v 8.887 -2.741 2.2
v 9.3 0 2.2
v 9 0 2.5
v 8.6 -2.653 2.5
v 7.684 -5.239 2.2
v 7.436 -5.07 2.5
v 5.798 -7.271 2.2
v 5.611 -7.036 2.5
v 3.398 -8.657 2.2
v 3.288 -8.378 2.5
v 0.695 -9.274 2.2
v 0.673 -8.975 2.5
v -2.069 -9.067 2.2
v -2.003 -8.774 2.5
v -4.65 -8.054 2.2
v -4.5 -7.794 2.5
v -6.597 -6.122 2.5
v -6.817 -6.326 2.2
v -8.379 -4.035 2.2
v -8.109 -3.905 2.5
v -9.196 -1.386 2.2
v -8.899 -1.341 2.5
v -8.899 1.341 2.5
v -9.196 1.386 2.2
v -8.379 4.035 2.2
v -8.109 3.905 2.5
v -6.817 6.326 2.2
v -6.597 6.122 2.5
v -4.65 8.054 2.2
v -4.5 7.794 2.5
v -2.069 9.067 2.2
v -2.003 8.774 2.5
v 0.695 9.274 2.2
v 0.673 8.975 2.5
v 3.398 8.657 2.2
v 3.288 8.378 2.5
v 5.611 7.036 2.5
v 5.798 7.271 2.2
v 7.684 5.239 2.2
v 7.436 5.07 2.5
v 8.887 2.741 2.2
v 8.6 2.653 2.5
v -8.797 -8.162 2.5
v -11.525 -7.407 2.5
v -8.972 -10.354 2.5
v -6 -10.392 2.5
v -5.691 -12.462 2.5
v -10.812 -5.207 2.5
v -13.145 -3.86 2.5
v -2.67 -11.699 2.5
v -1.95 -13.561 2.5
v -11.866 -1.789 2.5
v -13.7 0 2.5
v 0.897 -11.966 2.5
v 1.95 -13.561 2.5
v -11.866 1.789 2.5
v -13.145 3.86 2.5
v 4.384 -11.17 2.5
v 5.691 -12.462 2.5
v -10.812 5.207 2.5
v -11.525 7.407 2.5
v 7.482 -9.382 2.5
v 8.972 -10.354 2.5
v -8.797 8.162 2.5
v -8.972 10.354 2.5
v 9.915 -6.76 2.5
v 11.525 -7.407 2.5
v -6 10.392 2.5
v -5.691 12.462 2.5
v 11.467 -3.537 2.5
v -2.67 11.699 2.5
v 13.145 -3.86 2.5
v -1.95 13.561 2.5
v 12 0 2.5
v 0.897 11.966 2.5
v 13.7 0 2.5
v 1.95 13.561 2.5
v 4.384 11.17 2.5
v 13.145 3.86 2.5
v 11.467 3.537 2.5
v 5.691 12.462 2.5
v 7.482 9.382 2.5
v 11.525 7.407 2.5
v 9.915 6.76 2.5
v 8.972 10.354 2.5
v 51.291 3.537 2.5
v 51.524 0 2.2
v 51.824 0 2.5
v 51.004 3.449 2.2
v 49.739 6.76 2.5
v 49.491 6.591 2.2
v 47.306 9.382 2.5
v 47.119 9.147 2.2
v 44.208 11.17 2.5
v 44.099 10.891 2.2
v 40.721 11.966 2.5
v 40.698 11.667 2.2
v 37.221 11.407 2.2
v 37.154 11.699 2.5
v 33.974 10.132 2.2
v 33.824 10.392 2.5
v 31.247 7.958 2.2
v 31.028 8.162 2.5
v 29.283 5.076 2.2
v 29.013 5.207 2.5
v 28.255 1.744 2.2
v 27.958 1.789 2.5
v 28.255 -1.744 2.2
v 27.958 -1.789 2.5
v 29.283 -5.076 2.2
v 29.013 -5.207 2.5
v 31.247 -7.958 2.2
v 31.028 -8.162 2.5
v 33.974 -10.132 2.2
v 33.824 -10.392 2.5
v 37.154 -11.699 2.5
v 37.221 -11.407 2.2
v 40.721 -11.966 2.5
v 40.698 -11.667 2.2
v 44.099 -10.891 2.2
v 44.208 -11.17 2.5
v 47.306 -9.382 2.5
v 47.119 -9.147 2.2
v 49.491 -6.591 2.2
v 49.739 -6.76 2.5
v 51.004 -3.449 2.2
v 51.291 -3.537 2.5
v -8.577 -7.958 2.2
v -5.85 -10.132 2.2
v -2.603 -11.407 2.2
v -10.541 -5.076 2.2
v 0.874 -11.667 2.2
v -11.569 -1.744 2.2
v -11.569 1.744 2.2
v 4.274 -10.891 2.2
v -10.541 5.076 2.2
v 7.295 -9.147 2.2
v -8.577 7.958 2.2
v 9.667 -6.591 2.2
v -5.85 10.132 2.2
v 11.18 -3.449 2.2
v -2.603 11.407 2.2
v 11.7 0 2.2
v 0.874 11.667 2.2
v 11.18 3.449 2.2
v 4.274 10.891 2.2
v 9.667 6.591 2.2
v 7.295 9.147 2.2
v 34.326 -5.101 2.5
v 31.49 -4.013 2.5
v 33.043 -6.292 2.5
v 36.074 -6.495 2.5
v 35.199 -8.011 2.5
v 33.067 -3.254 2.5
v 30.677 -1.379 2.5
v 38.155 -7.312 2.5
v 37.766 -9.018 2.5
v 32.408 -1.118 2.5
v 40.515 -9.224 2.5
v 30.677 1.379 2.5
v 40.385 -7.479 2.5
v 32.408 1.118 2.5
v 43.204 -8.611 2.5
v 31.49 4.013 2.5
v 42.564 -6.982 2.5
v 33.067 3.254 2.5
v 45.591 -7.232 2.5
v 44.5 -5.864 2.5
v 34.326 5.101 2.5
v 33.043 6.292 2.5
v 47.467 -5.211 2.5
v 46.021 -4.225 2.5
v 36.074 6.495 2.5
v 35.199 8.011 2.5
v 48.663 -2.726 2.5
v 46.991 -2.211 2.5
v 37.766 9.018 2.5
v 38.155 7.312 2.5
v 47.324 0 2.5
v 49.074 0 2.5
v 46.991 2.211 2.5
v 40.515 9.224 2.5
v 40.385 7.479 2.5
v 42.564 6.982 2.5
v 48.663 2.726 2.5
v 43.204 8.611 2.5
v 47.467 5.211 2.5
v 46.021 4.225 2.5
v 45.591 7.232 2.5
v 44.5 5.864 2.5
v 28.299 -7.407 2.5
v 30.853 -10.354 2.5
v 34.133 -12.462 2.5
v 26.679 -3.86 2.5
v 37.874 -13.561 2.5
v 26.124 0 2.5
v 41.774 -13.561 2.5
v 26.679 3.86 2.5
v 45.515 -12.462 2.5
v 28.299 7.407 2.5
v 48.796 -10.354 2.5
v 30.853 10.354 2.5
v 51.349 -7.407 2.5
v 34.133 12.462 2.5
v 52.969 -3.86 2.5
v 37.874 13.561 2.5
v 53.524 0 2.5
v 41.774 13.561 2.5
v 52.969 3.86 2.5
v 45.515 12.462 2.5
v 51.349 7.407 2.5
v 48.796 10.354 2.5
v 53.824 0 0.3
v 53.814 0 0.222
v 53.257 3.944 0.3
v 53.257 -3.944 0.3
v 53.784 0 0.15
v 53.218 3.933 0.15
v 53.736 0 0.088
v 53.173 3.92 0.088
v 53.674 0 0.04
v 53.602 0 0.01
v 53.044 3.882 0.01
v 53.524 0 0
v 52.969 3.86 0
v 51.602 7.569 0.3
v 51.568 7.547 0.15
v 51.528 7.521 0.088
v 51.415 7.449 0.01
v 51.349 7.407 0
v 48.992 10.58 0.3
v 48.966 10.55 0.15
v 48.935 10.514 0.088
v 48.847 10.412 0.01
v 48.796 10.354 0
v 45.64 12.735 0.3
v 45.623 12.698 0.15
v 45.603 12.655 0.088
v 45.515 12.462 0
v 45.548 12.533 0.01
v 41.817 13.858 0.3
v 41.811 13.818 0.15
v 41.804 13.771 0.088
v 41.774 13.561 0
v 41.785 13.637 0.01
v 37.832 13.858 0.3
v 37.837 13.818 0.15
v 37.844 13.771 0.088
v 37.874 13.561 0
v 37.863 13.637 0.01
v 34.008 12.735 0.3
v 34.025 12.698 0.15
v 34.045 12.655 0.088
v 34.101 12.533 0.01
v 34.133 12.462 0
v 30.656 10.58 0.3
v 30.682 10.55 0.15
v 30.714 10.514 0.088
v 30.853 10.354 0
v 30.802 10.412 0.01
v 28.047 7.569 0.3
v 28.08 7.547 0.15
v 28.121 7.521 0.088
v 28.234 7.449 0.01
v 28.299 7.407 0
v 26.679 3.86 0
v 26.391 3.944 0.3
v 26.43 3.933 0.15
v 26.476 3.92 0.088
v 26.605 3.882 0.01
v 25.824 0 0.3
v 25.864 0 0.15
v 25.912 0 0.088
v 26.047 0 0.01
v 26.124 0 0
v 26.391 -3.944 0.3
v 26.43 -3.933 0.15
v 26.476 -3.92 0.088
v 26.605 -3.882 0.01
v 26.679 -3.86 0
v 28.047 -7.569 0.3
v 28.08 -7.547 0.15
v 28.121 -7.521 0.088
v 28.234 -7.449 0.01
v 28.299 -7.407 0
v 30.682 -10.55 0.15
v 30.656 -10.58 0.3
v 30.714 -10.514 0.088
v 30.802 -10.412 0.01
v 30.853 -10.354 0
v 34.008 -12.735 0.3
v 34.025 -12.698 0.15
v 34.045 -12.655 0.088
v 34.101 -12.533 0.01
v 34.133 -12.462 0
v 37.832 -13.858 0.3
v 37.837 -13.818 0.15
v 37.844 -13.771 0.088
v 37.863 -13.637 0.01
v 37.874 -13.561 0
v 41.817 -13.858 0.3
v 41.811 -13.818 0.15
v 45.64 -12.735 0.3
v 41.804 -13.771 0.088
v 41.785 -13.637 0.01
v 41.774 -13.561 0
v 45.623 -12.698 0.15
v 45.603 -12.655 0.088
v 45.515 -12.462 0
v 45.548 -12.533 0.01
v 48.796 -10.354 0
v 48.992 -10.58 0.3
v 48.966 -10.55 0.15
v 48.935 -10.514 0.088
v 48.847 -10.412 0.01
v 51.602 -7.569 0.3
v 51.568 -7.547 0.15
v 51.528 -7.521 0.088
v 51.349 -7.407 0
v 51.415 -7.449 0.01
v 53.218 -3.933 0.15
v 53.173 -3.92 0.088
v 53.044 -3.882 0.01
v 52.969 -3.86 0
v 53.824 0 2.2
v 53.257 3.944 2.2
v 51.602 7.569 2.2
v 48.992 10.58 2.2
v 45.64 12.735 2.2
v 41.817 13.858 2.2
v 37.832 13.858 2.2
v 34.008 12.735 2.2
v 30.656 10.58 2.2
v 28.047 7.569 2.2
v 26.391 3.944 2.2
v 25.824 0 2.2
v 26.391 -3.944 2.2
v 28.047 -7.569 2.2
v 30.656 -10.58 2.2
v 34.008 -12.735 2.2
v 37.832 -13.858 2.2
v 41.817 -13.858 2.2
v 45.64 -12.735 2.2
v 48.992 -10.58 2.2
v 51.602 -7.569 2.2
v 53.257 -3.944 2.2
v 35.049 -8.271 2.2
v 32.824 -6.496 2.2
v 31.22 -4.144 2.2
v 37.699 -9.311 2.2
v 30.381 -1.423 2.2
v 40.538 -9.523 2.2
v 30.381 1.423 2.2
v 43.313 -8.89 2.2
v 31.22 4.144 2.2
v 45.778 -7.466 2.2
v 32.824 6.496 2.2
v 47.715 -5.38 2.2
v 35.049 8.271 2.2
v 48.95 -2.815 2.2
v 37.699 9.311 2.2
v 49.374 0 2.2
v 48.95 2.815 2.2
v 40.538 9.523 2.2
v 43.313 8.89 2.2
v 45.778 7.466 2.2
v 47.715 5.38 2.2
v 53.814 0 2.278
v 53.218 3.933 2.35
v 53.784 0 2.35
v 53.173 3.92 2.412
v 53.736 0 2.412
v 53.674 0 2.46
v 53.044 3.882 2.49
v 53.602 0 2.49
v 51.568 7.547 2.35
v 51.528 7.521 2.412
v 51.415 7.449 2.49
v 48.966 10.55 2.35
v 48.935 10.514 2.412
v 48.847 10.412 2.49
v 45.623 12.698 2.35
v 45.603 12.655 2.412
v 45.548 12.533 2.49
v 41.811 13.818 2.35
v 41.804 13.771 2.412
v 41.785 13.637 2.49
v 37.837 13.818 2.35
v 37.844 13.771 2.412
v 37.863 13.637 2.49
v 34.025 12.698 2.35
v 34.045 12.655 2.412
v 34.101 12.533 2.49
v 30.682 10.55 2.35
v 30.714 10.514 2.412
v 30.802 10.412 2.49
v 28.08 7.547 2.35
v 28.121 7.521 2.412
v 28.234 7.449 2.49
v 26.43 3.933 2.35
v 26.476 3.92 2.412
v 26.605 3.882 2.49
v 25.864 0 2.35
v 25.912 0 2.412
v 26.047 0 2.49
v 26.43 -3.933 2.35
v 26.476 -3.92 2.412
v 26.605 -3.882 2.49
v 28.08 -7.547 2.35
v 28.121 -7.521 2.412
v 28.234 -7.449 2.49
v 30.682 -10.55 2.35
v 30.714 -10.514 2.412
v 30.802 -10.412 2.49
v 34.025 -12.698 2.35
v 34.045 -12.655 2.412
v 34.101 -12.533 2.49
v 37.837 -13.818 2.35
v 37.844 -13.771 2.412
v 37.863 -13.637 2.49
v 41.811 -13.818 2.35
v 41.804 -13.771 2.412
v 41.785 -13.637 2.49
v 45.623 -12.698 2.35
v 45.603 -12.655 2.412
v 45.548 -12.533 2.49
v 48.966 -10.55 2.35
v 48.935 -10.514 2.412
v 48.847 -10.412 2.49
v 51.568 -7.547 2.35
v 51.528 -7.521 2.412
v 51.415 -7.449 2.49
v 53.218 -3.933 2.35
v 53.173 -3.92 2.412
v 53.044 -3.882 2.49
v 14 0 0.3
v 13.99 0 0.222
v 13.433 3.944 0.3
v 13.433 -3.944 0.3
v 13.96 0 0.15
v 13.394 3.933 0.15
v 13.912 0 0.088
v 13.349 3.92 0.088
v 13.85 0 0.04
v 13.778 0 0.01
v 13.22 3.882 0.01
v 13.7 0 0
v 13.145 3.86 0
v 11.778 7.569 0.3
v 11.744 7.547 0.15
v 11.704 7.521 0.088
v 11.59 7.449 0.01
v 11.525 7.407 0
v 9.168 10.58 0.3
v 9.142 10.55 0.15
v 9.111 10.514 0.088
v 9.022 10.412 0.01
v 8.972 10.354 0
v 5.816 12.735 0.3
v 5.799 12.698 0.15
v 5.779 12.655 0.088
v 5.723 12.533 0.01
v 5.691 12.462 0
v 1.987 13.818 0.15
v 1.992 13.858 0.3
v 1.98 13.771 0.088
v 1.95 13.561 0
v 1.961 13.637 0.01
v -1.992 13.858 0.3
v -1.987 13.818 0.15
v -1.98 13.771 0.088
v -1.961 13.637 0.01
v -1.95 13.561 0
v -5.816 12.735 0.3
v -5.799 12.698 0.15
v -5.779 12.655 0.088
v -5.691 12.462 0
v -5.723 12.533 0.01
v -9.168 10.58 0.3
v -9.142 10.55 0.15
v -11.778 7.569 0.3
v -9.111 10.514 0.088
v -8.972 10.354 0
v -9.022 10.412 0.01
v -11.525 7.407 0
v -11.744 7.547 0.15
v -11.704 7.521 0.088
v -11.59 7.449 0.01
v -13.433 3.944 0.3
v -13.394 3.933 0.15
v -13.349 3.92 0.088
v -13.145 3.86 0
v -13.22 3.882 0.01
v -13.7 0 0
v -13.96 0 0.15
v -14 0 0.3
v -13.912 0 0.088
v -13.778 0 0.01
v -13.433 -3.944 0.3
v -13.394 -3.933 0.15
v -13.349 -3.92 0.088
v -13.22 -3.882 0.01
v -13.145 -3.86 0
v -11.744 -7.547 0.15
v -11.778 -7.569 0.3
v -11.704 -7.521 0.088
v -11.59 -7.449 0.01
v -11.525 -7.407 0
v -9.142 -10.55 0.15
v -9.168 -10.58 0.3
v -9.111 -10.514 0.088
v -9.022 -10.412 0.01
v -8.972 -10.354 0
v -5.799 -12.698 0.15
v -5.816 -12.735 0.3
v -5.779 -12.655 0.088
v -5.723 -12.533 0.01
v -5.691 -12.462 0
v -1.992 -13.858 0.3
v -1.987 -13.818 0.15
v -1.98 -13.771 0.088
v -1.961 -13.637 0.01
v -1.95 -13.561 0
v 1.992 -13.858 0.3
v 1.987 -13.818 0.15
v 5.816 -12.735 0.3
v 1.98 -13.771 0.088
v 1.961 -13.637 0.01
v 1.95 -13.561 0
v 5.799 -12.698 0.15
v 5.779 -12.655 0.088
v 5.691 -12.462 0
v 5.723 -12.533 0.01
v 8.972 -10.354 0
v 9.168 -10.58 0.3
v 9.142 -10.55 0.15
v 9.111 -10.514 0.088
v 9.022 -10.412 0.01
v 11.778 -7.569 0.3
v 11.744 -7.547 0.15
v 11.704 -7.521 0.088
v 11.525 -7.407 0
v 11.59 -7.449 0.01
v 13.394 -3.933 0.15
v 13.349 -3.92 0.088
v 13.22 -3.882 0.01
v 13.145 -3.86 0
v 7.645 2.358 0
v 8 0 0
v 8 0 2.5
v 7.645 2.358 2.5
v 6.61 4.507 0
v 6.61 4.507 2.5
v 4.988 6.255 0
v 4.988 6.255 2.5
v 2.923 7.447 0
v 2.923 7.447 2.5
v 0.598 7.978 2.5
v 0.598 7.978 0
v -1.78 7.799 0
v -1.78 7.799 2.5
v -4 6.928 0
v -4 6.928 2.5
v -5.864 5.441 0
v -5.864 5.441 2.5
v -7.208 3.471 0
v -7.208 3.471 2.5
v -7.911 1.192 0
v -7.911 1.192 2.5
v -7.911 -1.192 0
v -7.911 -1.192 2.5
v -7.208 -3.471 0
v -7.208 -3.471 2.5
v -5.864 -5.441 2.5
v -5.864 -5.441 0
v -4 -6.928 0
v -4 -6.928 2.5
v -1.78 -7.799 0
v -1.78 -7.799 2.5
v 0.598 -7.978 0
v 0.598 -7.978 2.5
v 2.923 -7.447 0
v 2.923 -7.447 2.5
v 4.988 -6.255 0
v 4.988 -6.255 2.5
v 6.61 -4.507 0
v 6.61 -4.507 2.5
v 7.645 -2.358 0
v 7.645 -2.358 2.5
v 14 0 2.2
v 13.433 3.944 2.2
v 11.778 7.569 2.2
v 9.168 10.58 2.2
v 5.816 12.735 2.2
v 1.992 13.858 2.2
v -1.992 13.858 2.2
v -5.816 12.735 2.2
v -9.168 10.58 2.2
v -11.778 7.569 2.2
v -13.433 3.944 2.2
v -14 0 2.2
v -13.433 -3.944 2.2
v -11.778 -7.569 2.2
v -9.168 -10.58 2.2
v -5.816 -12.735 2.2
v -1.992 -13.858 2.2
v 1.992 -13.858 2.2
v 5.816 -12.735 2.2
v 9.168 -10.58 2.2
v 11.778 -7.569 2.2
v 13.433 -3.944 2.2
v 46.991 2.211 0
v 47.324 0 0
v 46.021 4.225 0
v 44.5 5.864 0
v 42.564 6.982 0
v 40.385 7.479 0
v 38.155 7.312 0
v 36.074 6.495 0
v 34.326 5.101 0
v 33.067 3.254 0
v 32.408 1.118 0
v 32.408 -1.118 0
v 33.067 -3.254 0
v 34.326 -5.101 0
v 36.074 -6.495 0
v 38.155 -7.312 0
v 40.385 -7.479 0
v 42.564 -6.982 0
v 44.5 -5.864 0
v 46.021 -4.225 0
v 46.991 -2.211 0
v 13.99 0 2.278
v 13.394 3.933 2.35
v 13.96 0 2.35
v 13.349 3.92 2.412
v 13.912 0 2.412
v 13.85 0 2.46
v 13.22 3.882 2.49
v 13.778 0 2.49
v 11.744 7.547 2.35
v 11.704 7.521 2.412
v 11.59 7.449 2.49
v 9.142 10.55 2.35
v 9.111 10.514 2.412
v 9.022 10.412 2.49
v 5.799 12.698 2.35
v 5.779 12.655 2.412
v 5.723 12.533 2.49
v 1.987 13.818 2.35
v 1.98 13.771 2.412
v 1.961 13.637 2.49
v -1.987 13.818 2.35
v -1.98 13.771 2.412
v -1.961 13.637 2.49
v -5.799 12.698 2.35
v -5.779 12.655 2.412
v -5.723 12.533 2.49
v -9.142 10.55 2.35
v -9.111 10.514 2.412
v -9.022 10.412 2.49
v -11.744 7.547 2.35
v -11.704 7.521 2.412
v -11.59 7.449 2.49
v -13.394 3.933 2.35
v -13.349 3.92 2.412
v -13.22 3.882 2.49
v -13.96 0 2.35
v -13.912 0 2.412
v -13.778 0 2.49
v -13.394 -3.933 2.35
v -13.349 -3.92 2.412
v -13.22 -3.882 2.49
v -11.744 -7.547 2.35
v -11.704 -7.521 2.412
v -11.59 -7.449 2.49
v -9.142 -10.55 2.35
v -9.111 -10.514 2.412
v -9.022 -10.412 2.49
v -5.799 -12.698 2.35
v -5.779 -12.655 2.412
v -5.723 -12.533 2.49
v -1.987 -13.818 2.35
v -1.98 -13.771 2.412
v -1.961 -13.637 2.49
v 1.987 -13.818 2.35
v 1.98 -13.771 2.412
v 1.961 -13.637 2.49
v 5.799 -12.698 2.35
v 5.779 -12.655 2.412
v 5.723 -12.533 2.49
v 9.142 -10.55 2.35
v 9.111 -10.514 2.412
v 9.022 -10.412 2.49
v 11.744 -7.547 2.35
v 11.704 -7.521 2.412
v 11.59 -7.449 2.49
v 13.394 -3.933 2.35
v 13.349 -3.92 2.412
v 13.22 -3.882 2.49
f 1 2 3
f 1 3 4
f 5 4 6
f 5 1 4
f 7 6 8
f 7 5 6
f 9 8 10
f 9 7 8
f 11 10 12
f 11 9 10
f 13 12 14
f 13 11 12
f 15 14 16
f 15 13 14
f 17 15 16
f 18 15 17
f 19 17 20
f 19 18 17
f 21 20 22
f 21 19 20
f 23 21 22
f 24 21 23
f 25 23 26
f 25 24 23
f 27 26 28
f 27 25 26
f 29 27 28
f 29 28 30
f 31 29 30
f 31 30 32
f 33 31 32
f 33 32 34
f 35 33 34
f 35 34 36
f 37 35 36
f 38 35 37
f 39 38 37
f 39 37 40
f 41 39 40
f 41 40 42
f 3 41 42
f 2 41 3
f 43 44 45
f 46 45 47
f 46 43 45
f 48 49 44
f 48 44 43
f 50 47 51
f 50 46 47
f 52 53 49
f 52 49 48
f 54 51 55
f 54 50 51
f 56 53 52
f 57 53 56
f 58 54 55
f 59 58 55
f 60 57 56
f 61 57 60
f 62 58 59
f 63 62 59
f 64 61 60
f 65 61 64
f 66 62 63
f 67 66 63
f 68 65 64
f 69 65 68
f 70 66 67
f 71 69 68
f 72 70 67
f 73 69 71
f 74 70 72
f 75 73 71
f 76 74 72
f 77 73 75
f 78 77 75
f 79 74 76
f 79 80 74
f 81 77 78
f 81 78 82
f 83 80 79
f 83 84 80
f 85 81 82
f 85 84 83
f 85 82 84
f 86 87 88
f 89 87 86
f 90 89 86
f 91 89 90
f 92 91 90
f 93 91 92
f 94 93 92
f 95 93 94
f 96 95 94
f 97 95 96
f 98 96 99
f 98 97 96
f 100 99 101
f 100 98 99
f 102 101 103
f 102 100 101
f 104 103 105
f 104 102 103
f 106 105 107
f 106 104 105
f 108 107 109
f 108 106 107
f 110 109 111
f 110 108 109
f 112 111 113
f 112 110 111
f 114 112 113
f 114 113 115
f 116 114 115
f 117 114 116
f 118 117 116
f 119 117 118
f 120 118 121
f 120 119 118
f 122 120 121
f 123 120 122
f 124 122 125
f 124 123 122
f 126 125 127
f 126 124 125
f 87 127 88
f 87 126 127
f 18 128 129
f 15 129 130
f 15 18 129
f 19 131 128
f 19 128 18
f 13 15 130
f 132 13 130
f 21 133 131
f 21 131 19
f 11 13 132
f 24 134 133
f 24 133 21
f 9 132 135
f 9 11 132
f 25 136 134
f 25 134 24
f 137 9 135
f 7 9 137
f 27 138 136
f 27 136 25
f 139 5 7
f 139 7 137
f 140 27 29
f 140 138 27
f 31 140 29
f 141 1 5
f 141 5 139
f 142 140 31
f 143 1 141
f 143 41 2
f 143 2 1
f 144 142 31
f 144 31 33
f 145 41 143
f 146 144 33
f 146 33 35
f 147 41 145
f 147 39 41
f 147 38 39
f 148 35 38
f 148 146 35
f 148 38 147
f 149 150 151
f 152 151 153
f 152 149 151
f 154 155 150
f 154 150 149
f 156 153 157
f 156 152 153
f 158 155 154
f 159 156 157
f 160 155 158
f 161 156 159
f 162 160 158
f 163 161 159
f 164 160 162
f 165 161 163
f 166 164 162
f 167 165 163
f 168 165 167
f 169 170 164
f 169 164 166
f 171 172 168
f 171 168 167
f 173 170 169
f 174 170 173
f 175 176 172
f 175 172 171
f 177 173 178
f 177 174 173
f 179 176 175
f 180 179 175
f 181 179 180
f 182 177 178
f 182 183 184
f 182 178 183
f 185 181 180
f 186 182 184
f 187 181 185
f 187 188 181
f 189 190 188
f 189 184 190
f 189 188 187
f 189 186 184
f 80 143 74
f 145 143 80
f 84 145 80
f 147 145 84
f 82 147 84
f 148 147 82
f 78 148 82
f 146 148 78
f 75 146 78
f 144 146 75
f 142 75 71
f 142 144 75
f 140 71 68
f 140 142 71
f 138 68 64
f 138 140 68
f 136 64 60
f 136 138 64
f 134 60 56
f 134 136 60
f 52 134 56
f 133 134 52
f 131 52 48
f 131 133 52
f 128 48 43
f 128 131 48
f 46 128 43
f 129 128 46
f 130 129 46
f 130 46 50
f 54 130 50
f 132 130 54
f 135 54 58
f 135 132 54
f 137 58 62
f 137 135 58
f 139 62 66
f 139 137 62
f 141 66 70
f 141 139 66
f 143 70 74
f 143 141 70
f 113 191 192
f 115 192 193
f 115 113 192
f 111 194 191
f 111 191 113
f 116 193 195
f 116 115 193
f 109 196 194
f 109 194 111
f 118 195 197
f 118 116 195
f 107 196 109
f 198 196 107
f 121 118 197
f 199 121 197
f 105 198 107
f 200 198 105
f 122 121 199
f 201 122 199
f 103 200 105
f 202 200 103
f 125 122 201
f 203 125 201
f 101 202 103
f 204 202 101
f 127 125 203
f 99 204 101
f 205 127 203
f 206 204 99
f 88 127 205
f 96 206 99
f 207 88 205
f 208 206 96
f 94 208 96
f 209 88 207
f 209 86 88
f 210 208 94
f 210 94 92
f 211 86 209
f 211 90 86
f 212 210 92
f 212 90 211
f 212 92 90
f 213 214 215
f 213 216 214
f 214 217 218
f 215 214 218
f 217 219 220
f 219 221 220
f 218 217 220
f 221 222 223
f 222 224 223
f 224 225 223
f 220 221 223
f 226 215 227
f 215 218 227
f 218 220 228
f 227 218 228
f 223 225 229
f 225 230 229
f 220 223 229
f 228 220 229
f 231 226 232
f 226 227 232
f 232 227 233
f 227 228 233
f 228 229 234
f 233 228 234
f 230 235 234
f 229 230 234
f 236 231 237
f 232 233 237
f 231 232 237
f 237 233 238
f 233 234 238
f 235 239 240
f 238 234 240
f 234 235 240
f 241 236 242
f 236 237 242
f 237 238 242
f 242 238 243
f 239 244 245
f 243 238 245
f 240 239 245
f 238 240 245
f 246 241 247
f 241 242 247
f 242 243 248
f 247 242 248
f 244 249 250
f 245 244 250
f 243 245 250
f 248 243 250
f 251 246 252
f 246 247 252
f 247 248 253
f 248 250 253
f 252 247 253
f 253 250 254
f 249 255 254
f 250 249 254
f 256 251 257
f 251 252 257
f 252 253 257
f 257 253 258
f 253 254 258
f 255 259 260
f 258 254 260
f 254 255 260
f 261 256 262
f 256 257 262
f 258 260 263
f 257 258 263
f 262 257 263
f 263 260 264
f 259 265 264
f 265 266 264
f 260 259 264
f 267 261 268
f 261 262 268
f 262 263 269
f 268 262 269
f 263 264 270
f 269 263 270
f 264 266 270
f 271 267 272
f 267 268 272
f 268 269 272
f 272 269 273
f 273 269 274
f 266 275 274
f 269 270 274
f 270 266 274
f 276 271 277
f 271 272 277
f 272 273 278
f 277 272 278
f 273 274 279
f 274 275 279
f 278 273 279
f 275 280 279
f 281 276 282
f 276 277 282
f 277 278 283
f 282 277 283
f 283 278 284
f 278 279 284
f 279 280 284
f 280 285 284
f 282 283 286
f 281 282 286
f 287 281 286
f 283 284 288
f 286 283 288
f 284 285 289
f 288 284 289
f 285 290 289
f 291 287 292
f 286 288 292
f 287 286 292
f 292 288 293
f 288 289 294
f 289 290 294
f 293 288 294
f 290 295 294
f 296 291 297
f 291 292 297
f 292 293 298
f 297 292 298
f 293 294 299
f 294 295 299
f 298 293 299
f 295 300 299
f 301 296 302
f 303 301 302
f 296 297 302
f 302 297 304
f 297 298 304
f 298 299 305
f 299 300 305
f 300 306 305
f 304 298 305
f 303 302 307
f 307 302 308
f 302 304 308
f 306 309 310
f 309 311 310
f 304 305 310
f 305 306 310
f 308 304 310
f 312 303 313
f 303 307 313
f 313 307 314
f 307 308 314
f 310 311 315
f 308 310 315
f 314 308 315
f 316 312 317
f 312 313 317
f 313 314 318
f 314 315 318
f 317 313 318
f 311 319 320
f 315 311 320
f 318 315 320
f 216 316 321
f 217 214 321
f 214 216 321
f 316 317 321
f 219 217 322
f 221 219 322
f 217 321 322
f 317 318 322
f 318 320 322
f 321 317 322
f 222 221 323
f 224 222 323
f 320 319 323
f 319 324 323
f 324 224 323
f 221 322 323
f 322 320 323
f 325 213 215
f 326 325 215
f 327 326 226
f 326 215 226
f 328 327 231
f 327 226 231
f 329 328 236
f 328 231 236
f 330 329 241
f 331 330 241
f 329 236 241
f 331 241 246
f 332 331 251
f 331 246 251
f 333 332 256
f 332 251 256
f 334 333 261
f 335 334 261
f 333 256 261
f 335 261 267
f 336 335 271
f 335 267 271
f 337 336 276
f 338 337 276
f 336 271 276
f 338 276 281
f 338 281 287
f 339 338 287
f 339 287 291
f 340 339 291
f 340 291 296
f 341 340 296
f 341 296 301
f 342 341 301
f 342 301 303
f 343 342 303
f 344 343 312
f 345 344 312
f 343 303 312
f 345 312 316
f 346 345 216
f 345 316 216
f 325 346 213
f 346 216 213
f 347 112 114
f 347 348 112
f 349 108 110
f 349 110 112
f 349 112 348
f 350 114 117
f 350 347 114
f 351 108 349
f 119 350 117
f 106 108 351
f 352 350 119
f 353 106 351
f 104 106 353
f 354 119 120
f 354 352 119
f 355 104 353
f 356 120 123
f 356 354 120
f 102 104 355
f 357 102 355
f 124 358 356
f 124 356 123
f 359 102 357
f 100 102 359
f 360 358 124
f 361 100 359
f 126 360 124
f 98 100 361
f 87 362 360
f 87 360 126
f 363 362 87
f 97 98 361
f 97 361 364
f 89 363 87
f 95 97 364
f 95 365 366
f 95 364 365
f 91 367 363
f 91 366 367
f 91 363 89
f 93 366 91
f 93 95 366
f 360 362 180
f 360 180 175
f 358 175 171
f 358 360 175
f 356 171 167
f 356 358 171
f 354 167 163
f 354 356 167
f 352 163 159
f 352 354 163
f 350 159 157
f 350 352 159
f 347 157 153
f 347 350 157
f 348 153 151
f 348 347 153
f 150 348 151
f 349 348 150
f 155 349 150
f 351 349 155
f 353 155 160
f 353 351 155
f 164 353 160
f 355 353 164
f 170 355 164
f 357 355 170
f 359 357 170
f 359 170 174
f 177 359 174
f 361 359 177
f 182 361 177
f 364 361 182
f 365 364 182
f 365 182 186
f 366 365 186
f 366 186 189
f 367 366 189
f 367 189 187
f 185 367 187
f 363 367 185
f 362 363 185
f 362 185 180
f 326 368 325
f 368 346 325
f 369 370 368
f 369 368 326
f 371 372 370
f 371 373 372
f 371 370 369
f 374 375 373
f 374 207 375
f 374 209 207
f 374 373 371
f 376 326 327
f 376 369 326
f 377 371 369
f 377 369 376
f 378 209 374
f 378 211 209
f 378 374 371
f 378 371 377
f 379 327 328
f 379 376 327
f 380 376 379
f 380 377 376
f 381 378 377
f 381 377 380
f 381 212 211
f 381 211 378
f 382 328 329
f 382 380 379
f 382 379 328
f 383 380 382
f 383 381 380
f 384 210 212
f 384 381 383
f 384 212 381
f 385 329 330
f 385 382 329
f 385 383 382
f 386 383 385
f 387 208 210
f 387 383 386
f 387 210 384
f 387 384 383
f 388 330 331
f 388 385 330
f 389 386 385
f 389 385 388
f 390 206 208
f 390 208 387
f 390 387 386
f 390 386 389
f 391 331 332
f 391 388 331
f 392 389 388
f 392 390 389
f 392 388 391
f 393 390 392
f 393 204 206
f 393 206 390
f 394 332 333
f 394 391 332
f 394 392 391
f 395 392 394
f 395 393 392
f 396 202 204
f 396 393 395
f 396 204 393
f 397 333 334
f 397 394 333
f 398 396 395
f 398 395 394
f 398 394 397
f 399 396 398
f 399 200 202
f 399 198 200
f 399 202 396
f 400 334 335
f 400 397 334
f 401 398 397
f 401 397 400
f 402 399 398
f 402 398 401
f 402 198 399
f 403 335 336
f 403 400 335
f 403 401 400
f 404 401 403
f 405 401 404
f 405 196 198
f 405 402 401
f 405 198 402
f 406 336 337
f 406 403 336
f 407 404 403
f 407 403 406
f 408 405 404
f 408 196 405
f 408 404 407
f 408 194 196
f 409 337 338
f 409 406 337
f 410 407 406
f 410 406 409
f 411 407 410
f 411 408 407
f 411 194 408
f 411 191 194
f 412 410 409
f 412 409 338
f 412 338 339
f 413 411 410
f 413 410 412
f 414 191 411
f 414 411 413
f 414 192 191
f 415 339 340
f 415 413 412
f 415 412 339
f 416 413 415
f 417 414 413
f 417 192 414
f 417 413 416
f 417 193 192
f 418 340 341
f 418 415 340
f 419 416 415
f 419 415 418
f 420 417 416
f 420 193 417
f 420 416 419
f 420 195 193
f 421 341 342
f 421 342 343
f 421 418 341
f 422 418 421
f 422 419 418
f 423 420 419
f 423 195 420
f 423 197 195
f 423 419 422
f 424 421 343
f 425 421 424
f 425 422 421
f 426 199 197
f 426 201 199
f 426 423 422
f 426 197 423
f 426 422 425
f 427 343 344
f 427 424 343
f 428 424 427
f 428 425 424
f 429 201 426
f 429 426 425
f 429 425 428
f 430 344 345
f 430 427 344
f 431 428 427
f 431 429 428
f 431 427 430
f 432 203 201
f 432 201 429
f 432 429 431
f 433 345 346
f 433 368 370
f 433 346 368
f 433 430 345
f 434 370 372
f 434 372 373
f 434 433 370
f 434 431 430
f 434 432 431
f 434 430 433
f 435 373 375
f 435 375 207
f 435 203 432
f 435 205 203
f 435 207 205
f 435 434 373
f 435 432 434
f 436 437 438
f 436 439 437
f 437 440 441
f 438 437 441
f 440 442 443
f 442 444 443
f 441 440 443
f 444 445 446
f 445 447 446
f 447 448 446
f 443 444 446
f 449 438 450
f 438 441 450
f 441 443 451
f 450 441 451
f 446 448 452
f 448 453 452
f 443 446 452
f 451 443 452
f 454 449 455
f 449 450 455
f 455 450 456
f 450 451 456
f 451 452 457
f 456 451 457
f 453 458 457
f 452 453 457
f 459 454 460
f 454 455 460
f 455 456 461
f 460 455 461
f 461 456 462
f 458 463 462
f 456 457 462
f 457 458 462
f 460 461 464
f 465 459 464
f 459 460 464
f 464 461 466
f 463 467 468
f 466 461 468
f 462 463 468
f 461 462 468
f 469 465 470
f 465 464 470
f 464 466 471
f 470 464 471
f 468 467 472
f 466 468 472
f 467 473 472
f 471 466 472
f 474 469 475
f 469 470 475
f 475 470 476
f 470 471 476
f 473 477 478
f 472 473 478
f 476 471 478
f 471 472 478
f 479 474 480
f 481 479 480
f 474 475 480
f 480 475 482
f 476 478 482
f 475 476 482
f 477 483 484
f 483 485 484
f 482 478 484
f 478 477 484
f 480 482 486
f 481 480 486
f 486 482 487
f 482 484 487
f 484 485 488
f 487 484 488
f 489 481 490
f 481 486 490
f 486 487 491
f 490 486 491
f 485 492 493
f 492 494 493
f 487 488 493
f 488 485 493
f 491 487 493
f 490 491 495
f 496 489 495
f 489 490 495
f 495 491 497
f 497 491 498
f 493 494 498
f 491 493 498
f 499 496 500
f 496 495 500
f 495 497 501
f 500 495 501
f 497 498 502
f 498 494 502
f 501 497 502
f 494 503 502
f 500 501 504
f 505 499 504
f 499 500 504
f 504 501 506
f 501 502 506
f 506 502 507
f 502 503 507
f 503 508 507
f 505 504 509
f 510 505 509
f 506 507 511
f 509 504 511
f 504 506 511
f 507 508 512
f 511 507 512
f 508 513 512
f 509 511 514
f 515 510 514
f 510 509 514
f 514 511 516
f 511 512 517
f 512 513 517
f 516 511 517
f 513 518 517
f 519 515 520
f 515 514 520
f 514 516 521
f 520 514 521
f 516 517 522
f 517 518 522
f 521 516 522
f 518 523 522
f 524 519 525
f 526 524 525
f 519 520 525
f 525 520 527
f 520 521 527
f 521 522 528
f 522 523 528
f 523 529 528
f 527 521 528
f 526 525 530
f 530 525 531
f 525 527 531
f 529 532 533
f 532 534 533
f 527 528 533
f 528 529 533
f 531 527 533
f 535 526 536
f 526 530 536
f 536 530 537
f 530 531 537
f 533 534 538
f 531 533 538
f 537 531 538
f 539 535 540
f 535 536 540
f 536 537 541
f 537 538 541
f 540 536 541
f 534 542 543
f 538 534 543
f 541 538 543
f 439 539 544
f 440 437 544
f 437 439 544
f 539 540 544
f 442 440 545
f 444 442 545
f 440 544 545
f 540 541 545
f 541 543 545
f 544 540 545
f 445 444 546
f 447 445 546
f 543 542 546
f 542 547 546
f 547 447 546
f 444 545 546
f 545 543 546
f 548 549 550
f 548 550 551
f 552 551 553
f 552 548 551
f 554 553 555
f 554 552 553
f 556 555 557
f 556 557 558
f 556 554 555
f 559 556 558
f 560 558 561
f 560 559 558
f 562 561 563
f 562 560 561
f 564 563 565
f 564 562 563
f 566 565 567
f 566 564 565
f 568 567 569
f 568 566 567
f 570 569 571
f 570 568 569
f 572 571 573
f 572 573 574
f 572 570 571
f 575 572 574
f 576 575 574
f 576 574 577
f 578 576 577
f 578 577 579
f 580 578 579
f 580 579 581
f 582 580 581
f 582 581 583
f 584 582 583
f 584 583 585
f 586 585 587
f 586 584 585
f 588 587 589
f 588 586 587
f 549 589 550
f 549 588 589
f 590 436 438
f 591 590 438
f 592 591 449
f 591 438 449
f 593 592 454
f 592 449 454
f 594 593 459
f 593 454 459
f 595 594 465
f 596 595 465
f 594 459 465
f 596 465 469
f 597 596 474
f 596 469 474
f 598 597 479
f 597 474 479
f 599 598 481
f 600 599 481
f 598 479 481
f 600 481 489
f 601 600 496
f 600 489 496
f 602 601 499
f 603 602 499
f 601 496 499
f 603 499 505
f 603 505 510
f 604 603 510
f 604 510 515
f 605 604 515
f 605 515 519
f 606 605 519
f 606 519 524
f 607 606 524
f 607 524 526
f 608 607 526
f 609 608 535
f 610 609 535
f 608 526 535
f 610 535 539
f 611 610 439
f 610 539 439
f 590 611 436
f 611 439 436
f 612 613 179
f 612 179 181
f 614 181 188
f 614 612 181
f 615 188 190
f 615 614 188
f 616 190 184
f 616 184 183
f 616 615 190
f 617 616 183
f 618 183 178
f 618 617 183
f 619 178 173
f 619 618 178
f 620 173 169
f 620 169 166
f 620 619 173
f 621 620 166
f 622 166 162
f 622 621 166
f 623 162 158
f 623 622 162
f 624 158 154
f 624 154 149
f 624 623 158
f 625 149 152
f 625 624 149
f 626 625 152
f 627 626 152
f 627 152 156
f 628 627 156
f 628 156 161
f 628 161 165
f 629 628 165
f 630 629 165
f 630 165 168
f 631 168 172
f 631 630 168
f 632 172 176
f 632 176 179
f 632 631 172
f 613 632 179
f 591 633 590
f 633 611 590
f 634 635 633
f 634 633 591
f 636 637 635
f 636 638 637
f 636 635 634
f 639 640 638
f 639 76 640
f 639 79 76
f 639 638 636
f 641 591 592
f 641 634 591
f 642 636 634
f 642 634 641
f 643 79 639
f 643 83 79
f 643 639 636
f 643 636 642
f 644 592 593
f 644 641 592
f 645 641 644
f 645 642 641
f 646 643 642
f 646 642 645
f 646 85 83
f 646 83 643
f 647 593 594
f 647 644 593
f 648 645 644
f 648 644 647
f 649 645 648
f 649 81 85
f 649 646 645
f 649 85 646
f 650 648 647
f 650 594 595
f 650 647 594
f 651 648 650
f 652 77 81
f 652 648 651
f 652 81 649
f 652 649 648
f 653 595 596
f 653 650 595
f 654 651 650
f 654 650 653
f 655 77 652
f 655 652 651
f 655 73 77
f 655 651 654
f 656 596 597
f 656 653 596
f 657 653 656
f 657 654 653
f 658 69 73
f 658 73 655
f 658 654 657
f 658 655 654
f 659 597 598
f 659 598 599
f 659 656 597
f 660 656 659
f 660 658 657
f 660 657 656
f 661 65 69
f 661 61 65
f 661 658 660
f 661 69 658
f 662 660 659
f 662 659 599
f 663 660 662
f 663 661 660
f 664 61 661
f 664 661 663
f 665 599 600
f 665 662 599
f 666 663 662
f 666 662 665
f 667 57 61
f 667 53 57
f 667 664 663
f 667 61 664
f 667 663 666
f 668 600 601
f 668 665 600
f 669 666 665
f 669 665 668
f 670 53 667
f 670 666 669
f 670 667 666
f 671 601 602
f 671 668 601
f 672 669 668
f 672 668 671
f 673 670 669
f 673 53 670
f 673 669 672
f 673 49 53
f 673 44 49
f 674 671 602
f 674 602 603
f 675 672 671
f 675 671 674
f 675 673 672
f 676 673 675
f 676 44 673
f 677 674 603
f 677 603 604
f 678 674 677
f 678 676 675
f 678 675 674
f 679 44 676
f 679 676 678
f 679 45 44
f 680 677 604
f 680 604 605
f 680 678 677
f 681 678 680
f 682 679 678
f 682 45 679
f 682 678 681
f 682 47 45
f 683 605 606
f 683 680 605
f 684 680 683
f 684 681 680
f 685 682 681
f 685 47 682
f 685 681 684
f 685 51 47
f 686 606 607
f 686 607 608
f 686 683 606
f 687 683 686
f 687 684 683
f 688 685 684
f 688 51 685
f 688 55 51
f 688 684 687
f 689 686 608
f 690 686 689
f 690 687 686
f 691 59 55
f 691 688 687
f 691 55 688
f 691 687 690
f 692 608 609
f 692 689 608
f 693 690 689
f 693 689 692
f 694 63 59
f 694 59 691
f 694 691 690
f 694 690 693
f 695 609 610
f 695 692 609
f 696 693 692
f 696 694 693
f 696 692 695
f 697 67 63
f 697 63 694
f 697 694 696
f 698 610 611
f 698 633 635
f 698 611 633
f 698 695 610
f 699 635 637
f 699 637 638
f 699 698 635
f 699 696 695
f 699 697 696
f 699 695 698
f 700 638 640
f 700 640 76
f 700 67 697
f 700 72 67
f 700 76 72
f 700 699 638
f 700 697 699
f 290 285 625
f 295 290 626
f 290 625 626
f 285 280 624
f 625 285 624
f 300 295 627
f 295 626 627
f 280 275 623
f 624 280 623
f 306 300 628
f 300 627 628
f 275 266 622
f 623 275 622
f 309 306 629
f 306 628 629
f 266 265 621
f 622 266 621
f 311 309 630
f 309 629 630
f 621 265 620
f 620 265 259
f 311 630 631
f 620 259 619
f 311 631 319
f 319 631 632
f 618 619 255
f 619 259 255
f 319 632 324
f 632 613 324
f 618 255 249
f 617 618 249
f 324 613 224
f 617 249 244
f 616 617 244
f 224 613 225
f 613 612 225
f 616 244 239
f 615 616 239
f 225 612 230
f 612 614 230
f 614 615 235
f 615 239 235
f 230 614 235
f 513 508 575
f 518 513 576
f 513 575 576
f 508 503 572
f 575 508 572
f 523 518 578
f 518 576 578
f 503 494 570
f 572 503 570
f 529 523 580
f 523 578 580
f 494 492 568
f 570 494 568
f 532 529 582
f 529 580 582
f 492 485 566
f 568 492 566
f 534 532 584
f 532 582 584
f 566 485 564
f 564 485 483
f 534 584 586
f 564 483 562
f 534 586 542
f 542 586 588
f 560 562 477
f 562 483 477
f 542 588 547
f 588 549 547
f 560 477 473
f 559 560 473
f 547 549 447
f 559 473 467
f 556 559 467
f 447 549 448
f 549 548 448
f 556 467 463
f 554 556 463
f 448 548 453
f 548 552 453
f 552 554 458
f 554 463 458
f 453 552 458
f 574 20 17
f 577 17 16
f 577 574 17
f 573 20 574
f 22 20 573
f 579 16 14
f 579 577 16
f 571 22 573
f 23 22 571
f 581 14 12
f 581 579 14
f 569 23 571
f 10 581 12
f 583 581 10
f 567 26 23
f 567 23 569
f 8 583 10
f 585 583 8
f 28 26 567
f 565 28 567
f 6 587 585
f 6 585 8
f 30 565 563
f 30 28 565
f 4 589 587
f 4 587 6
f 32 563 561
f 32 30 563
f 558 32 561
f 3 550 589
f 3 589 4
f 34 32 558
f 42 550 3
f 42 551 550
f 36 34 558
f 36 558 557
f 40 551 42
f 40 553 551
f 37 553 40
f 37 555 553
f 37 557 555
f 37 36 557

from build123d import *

# Parameters (mm, degrees)
F0_R     = 14
F0_R_2   = 8
F1_DEPTH = 2.5
F2_R     = 12
F2_R_2   = 9
F3_DEPTH = 0.3
F3_TAPER = 45
F4_R     = 0.3
F5_R     = 14
F5_R_2   = 7.5
F6_DEPTH = 2.5
F7_R     = 12
F7_R_2   = 9.25
F8_DEPTH = 0.3
F8_TAPER = 45
F9_R     = 0.3


with BuildPart() as f1:
    # F0 (on Top) → F1 (new body)
    with BuildSketch(Plane.XY):
        Circle(F0_R)
        Circle(F0_R_2, mode=Mode.SUBTRACT)
    extrude(amount=F1_DEPTH)

    # F2 (on face) → F3 (cut)
    with BuildSketch(Plane.XY.offset(2.5)):
        Circle(F2_R)
        Circle(F2_R_2, mode=Mode.SUBTRACT)
    extrude(amount=-F3_DEPTH, taper=F3_TAPER, mode=Mode.SUBTRACT)

    # F4
    f4_edges = [f1.edges().sort_by_distance(p)[0] for p in [
        (-14, 0, 2.5),
        (-14, 0, 0),
    ]]
    fillet(f4_edges, radius=F4_R)


with BuildPart() as f6:
    # F5 (on Top) → F6 (new body)
    with BuildSketch(Plane.XY):
        with Locations((39.8241467774, 0)):
            Circle(F5_R)
        with Locations((39.8241467774, 0)):
            Circle(F5_R_2, mode=Mode.SUBTRACT)
    extrude(amount=F6_DEPTH)

    # F7 (on face) → F8 (cut)
    with BuildSketch(Plane.XY.offset(2.5)):
        with Locations((39.8241467774, 0)):
            Circle(F7_R)
        with Locations((39.8241467774, 0)):
            Circle(F7_R_2, mode=Mode.SUBTRACT)
    extrude(amount=-F8_DEPTH, taper=F8_TAPER, mode=Mode.SUBTRACT)

    # F9
    f9_edges = [f6.edges().sort_by_distance(p)[0] for p in [
        (25.824147, 0, 2.5),
        (25.824147, 0, 0),
    ]]
    fillet(f9_edges, radius=F9_R)


solid = Compound([f1.part, f6.part])
